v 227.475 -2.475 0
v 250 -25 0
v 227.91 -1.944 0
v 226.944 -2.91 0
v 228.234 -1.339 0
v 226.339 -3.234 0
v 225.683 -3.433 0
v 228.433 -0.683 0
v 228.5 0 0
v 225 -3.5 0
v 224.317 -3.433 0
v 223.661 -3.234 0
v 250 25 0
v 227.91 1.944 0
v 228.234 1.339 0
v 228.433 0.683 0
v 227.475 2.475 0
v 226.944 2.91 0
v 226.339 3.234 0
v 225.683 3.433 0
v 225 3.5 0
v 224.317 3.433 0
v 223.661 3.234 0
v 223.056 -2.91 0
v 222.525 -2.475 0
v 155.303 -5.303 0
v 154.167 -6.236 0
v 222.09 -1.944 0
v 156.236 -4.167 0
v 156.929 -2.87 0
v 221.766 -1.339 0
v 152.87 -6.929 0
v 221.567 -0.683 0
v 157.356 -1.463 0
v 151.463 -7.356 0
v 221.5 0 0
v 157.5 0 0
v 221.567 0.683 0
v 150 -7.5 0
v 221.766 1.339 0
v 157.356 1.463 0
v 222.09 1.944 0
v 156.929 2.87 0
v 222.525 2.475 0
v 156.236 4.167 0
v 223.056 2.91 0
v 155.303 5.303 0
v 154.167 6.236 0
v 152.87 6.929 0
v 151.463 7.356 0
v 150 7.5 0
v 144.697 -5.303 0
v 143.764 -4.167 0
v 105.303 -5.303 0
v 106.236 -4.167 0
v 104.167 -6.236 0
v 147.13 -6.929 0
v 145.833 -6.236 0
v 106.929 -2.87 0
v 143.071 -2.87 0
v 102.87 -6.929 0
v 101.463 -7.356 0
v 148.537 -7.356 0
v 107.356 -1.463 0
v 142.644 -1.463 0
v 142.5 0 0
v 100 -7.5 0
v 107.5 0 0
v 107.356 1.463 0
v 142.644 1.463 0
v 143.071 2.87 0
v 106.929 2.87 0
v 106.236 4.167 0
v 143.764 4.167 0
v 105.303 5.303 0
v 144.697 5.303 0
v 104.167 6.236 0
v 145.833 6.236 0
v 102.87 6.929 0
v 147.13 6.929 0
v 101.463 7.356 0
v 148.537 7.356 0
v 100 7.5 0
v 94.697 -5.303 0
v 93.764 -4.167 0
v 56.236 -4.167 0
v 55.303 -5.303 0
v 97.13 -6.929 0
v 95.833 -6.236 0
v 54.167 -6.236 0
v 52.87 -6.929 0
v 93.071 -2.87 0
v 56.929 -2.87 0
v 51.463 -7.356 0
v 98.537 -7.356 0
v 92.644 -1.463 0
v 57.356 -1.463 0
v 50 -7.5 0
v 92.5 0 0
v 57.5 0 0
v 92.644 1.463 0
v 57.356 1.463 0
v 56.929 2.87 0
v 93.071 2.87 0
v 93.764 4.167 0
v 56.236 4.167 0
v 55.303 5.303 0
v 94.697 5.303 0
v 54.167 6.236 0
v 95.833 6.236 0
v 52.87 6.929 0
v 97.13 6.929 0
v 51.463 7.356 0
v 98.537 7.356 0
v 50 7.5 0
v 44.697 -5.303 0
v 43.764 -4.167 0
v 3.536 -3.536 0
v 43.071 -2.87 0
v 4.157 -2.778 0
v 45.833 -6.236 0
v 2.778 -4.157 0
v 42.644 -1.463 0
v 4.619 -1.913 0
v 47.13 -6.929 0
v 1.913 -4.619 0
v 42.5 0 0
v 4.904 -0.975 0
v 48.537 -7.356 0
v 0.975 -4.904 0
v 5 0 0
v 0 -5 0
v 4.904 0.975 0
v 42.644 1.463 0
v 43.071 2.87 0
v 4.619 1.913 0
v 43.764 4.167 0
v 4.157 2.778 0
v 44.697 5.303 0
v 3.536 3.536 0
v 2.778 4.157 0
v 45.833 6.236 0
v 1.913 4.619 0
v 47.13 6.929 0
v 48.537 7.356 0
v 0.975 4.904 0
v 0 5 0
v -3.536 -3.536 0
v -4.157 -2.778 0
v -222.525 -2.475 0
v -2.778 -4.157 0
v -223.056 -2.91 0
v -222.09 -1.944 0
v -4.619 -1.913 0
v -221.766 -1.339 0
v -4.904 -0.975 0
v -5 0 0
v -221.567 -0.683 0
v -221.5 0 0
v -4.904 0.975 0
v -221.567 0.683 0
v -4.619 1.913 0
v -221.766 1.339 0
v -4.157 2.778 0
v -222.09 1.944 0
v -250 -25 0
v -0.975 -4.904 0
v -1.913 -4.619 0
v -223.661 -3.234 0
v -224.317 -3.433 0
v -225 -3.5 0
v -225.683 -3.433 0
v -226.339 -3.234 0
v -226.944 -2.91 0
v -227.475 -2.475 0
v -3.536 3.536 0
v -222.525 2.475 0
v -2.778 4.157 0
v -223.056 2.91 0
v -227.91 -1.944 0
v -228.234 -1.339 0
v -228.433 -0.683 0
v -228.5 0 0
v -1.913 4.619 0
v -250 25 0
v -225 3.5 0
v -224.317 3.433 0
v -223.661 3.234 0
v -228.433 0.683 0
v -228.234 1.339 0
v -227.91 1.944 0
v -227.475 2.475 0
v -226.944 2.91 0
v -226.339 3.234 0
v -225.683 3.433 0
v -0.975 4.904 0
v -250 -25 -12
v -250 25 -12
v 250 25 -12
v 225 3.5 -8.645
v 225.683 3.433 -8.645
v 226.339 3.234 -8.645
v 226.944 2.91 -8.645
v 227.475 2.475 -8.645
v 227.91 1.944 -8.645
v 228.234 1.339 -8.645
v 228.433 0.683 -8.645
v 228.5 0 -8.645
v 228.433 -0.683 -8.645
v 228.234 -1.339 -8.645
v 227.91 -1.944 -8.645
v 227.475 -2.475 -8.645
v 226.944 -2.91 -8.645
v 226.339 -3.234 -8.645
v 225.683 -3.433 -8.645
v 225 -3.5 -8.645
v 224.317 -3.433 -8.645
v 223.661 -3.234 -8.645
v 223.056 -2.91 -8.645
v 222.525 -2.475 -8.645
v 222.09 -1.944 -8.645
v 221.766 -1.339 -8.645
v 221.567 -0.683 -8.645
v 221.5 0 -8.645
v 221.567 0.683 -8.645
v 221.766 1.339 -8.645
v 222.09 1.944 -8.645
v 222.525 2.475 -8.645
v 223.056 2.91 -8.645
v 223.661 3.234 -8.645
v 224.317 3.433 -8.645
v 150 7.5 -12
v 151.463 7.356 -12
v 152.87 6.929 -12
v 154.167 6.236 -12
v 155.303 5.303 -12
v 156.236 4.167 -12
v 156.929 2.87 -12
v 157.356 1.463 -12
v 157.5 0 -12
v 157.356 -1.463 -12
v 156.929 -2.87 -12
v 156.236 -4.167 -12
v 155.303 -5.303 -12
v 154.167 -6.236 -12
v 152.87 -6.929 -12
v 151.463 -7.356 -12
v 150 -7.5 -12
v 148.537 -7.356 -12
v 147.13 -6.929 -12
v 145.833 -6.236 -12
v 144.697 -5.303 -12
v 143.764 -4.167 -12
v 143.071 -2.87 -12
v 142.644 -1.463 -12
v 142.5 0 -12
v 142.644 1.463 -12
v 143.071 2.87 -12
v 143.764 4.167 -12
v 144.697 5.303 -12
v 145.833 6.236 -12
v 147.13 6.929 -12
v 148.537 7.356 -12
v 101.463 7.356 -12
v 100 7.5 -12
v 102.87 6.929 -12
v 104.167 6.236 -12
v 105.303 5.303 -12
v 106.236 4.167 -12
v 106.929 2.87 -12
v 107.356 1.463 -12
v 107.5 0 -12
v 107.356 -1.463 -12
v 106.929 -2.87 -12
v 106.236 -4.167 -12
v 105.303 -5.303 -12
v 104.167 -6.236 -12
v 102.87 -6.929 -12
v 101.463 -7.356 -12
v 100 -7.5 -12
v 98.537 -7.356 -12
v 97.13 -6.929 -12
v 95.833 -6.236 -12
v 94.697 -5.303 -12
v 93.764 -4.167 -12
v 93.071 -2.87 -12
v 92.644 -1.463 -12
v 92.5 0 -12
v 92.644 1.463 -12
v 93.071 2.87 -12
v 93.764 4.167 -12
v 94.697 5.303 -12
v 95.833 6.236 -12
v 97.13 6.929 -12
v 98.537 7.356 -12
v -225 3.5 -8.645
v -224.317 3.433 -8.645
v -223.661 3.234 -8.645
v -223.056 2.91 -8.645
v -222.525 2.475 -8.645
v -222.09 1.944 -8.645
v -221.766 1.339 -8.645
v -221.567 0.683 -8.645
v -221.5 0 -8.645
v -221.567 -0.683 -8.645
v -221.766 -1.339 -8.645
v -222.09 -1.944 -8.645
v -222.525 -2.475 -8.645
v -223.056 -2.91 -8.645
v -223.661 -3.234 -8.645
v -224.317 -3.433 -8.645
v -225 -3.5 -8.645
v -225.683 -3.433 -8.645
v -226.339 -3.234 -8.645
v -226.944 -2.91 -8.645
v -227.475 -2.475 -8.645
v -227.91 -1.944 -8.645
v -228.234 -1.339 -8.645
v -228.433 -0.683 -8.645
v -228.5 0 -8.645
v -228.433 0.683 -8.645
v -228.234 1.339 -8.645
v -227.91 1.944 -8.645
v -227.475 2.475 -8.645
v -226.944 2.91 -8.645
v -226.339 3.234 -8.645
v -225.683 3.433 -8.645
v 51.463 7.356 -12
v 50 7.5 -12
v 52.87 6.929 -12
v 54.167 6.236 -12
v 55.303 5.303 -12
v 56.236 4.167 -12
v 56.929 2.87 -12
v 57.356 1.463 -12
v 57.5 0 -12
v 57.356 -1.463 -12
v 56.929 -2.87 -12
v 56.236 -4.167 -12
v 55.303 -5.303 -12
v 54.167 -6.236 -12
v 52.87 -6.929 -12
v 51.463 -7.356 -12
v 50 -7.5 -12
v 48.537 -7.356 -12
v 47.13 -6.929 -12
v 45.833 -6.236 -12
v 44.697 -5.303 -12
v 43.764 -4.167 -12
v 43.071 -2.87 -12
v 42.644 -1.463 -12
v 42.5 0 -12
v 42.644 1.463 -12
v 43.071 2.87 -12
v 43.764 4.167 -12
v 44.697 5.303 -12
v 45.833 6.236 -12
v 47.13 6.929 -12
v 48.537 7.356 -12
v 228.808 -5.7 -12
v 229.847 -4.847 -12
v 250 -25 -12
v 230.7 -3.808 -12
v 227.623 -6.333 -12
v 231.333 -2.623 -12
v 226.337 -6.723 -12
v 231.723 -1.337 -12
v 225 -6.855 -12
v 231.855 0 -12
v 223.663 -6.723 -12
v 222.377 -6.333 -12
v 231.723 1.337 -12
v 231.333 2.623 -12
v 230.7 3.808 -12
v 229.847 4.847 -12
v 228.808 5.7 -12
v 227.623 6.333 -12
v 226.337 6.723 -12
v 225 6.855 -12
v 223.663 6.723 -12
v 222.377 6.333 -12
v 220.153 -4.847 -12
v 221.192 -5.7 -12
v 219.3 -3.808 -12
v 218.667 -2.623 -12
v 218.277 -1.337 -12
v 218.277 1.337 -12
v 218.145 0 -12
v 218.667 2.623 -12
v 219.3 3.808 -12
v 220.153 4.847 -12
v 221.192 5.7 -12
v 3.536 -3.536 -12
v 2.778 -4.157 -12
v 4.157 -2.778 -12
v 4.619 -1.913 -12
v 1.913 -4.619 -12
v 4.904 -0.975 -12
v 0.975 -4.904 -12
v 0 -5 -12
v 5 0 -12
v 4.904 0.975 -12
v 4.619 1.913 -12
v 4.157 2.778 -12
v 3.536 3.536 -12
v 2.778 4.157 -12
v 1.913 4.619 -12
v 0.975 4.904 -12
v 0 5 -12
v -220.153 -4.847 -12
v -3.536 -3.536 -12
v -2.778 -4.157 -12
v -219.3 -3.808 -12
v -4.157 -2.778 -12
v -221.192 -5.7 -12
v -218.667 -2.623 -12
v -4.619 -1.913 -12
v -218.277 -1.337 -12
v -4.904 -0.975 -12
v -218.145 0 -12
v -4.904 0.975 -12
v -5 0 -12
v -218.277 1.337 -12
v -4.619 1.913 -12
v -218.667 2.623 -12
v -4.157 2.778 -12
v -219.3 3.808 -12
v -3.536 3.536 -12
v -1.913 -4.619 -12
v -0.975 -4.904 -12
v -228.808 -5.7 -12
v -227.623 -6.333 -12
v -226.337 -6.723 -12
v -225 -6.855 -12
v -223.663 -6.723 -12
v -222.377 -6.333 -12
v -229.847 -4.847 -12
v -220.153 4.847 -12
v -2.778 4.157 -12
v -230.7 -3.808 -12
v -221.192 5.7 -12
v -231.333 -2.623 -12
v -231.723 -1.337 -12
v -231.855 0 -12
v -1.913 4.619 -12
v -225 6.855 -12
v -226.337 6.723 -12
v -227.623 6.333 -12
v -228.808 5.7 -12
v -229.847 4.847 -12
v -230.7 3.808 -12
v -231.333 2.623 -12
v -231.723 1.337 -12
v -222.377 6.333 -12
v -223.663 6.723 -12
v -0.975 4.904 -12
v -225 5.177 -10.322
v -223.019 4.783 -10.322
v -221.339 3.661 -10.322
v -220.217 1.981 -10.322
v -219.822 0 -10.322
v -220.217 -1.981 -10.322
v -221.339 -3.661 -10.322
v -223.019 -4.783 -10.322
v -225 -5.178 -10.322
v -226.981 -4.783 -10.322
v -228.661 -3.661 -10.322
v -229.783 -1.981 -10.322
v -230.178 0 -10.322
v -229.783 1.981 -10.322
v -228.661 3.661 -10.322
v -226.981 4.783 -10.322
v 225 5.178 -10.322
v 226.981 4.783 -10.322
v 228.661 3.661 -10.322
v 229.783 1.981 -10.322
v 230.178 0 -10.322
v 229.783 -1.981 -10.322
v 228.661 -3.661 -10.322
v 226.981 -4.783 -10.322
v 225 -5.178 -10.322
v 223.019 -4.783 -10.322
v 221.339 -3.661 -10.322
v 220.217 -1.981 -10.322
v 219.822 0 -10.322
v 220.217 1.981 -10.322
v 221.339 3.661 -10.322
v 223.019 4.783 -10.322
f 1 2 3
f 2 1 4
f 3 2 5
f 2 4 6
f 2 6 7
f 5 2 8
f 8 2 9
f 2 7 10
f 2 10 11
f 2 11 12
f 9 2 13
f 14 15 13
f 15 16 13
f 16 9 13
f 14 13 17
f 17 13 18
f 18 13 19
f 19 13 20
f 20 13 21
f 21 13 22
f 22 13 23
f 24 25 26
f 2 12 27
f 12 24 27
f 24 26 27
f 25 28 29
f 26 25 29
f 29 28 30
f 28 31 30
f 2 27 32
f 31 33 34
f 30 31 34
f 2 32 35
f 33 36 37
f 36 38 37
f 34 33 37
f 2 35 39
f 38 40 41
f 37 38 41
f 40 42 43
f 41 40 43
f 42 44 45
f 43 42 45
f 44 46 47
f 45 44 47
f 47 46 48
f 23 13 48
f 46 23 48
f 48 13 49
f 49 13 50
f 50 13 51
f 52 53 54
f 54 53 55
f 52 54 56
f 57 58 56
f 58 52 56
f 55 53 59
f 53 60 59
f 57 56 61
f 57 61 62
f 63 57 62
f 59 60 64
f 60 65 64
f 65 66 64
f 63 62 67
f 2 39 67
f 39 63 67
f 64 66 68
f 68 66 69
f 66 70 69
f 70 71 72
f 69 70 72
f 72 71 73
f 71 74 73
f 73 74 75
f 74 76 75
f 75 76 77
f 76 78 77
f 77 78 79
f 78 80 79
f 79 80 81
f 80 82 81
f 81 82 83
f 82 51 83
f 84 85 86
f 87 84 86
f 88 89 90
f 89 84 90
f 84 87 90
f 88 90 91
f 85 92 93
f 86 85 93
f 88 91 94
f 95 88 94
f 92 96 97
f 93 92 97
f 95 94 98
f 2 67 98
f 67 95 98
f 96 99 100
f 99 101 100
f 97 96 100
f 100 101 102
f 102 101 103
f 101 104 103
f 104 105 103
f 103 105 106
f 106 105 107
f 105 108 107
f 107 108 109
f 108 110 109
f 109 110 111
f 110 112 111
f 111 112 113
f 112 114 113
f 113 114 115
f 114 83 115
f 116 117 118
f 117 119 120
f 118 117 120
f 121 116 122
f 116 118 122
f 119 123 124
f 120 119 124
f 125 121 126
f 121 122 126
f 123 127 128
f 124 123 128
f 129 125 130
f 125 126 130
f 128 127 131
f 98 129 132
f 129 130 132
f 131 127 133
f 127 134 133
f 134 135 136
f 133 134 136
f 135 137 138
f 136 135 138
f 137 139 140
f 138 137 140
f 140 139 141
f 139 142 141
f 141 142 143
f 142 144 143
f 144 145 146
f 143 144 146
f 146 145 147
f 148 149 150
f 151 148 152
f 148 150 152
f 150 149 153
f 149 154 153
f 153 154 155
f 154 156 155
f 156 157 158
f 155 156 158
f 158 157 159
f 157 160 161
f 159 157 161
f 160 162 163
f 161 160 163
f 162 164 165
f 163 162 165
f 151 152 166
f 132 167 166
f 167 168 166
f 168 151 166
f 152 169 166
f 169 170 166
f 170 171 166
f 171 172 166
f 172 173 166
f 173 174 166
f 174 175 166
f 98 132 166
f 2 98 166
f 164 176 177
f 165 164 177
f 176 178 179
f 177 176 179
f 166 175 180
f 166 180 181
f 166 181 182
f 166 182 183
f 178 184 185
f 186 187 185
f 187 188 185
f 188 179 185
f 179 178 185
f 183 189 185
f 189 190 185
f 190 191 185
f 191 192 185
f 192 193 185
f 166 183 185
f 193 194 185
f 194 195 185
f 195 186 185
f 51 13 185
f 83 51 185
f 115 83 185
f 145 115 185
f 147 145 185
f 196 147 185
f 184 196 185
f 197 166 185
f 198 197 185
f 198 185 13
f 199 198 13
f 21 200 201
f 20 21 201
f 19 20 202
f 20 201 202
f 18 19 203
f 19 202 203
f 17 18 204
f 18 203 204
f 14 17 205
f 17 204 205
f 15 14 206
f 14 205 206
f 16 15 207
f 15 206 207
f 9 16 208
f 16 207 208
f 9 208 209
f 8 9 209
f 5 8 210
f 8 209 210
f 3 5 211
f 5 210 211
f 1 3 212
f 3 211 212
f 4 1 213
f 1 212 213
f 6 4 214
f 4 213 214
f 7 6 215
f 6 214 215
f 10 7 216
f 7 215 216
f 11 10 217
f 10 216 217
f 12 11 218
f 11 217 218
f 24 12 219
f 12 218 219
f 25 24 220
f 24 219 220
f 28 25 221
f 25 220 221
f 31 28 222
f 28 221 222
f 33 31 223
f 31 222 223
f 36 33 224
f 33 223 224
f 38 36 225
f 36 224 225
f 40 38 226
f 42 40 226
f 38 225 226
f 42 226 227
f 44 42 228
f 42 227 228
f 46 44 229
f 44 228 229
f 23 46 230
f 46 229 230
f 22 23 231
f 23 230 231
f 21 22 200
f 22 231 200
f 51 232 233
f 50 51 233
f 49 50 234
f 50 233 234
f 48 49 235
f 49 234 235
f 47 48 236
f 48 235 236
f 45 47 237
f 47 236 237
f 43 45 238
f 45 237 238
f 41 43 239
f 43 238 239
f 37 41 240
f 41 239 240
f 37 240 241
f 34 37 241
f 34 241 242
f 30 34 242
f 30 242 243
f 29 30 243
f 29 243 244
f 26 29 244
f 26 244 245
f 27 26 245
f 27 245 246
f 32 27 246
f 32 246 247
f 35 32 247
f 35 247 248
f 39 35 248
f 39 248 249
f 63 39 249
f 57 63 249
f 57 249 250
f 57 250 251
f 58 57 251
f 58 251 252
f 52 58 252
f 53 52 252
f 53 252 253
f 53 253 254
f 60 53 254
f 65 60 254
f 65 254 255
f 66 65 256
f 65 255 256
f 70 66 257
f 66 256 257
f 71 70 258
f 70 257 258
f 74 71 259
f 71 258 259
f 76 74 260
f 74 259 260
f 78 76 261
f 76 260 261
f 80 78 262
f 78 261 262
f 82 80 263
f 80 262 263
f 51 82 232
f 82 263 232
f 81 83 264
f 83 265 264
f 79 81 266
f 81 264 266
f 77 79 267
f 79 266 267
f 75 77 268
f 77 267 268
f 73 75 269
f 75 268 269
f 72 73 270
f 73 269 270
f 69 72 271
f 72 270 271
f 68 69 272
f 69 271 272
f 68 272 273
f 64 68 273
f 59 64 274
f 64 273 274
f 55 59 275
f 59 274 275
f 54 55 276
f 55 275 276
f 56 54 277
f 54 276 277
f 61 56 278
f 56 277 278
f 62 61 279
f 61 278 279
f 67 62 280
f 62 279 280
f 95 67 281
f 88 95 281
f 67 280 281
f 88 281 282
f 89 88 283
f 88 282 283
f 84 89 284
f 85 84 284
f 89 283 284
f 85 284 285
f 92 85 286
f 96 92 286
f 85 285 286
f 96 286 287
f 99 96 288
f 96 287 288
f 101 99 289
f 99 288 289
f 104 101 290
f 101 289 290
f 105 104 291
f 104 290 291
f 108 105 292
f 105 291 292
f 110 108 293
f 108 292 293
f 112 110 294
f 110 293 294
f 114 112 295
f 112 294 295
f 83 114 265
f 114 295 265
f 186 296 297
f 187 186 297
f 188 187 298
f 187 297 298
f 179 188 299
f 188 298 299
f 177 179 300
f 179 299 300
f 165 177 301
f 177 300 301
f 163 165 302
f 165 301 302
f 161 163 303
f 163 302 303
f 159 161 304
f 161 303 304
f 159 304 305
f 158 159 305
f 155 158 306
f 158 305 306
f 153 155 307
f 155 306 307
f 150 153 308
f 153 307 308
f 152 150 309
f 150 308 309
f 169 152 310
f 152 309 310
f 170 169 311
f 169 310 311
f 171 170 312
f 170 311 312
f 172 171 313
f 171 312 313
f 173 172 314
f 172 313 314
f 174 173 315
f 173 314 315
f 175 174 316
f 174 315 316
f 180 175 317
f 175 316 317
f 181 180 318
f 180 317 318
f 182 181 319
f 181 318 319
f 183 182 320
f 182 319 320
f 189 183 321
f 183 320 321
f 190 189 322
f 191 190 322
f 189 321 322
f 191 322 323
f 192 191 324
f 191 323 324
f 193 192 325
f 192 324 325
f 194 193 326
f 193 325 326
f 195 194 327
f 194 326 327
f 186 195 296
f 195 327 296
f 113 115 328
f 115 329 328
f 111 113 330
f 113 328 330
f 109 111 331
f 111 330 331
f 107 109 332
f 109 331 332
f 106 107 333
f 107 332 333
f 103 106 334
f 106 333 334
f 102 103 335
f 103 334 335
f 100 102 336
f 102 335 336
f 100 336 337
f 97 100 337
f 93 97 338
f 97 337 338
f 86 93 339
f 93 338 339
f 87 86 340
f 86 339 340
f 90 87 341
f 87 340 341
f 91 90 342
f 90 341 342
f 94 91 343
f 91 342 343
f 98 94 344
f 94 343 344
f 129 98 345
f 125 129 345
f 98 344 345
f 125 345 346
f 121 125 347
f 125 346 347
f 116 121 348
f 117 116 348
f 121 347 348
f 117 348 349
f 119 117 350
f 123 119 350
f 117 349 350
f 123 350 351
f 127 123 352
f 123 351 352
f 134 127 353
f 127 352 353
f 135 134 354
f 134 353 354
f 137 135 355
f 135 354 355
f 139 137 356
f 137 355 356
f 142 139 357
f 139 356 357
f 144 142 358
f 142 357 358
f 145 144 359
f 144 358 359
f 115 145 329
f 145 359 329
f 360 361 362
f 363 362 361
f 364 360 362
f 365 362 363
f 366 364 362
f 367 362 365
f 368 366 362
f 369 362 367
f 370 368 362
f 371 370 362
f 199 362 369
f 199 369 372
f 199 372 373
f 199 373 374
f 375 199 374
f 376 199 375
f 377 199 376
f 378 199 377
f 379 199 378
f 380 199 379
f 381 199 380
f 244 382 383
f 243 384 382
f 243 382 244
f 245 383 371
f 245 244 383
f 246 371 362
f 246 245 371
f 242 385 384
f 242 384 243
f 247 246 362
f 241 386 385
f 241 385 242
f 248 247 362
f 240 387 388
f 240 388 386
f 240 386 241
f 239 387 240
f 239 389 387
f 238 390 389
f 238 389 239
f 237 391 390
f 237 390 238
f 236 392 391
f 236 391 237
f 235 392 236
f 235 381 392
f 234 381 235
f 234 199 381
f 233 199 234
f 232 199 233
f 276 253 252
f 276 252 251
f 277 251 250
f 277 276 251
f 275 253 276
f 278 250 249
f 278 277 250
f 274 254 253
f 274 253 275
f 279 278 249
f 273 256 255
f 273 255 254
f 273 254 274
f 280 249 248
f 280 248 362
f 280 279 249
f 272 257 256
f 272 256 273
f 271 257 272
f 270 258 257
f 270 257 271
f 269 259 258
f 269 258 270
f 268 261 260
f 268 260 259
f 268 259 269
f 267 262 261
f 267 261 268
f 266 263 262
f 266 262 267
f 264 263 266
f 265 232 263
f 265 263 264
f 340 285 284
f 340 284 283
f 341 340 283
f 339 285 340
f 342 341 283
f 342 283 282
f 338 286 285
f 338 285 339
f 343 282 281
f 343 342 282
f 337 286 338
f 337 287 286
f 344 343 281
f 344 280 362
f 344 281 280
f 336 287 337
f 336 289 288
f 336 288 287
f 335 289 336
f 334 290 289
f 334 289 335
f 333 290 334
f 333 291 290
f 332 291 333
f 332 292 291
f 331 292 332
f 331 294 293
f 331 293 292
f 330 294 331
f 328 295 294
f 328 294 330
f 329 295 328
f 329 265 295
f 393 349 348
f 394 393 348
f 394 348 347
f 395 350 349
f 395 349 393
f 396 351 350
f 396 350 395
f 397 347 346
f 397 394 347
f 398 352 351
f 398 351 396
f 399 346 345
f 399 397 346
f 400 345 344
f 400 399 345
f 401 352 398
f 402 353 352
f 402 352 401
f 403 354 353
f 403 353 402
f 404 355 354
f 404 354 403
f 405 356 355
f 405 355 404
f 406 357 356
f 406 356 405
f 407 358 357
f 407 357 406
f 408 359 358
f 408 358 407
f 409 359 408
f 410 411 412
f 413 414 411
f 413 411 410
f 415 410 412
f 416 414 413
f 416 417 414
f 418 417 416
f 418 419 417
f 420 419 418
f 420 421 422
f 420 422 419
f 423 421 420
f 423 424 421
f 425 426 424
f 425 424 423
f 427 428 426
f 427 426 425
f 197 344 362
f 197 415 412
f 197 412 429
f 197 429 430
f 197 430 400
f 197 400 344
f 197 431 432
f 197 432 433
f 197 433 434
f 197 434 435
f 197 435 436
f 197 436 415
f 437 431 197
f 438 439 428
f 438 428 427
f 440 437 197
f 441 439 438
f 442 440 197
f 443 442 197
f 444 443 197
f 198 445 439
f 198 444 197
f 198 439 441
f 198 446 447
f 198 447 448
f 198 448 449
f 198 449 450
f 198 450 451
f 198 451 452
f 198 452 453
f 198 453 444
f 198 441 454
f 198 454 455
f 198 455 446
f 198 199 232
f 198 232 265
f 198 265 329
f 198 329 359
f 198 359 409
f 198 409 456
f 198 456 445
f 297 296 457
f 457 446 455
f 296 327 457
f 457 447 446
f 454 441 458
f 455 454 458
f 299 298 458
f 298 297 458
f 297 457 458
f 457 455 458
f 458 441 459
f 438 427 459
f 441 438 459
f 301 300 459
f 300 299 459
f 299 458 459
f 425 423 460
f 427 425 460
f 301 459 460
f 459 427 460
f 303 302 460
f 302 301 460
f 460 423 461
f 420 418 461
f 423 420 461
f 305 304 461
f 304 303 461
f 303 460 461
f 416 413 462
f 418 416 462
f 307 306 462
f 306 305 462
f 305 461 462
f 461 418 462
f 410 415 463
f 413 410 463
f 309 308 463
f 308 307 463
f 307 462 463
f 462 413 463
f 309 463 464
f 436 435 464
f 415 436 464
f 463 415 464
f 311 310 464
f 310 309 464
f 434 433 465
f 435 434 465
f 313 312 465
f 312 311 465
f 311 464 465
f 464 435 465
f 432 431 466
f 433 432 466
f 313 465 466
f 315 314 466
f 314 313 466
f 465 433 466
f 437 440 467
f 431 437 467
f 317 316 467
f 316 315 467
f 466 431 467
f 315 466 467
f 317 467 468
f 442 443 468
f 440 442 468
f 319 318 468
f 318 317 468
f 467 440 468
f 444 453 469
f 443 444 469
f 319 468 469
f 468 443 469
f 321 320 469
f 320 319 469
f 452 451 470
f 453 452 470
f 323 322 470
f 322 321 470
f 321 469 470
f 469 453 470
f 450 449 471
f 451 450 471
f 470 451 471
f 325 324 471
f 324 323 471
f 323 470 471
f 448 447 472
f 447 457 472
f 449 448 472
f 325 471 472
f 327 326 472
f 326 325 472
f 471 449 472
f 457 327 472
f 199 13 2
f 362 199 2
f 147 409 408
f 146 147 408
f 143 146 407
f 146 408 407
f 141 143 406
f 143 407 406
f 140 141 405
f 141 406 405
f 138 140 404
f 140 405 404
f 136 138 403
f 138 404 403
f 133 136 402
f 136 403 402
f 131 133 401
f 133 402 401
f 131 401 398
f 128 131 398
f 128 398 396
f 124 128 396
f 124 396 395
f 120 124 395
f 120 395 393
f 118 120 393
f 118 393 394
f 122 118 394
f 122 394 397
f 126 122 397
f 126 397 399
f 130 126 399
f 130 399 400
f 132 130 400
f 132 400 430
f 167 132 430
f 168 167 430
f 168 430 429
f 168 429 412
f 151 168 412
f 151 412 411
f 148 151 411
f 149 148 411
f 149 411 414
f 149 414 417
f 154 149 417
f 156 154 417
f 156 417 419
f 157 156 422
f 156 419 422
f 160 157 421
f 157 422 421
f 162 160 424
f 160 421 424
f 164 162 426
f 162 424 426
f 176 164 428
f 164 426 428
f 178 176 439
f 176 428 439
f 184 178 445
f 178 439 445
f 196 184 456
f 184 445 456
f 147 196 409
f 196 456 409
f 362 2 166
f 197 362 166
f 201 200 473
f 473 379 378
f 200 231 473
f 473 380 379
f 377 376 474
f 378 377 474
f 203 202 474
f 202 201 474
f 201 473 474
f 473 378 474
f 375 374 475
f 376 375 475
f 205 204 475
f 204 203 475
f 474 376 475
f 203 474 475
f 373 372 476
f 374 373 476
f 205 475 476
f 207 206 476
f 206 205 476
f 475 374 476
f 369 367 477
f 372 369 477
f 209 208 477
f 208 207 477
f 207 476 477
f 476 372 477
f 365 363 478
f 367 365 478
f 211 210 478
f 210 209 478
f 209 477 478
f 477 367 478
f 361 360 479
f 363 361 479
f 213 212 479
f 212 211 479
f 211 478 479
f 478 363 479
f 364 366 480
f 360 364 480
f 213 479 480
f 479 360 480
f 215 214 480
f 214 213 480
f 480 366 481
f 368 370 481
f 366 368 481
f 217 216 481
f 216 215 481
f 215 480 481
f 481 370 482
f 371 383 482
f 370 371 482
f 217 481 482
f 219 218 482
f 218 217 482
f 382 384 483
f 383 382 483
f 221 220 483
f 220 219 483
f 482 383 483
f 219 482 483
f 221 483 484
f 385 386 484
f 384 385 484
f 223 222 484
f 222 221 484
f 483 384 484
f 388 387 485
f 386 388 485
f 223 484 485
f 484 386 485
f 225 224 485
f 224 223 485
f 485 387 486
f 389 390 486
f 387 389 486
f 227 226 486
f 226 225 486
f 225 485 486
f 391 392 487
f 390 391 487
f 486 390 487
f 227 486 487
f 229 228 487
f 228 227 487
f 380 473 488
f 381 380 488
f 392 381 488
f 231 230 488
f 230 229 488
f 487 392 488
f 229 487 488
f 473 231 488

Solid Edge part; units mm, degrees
sketch "Sketch1" plane through (0, 0, 0) normal (0, 0, 1) x (1, 0, 0)
  line L0 (250, -25) -> (-250, -25)
  line L1 (-250, -25) -> (-250, 25)
  line L2 (-250, 25) -> (250, 25)
  line L3 (250, 25) -> (250, -25)
extrude "Protrusion1" add sketch "Sketch1" against normal blind 12
hole "Hole_2" at (-225, 0, -12) direction (0, 0, 1) diameter 7 end up to next countersink diameter 13.71 countersink angle 90
hole "Hole1" at (225, 0, -12) direction (0, 0, 1) diameter 7 end up to next countersink diameter 13.71 countersink angle 90
hole "Hole_3" at (0, 0, -12) direction (0, 0, 1) diameter 10 end up to next
hole "Hole_4" at (150, 0, -12) direction (0, 0, 1) diameter 15 end up to next
hole "Hole2" at (100, 0, -12) direction (0, 0, 1) diameter 15 end up to next
hole "Hole3" at (50, 0, -12) direction (0, 0, 1) diameter 15 end up to next
